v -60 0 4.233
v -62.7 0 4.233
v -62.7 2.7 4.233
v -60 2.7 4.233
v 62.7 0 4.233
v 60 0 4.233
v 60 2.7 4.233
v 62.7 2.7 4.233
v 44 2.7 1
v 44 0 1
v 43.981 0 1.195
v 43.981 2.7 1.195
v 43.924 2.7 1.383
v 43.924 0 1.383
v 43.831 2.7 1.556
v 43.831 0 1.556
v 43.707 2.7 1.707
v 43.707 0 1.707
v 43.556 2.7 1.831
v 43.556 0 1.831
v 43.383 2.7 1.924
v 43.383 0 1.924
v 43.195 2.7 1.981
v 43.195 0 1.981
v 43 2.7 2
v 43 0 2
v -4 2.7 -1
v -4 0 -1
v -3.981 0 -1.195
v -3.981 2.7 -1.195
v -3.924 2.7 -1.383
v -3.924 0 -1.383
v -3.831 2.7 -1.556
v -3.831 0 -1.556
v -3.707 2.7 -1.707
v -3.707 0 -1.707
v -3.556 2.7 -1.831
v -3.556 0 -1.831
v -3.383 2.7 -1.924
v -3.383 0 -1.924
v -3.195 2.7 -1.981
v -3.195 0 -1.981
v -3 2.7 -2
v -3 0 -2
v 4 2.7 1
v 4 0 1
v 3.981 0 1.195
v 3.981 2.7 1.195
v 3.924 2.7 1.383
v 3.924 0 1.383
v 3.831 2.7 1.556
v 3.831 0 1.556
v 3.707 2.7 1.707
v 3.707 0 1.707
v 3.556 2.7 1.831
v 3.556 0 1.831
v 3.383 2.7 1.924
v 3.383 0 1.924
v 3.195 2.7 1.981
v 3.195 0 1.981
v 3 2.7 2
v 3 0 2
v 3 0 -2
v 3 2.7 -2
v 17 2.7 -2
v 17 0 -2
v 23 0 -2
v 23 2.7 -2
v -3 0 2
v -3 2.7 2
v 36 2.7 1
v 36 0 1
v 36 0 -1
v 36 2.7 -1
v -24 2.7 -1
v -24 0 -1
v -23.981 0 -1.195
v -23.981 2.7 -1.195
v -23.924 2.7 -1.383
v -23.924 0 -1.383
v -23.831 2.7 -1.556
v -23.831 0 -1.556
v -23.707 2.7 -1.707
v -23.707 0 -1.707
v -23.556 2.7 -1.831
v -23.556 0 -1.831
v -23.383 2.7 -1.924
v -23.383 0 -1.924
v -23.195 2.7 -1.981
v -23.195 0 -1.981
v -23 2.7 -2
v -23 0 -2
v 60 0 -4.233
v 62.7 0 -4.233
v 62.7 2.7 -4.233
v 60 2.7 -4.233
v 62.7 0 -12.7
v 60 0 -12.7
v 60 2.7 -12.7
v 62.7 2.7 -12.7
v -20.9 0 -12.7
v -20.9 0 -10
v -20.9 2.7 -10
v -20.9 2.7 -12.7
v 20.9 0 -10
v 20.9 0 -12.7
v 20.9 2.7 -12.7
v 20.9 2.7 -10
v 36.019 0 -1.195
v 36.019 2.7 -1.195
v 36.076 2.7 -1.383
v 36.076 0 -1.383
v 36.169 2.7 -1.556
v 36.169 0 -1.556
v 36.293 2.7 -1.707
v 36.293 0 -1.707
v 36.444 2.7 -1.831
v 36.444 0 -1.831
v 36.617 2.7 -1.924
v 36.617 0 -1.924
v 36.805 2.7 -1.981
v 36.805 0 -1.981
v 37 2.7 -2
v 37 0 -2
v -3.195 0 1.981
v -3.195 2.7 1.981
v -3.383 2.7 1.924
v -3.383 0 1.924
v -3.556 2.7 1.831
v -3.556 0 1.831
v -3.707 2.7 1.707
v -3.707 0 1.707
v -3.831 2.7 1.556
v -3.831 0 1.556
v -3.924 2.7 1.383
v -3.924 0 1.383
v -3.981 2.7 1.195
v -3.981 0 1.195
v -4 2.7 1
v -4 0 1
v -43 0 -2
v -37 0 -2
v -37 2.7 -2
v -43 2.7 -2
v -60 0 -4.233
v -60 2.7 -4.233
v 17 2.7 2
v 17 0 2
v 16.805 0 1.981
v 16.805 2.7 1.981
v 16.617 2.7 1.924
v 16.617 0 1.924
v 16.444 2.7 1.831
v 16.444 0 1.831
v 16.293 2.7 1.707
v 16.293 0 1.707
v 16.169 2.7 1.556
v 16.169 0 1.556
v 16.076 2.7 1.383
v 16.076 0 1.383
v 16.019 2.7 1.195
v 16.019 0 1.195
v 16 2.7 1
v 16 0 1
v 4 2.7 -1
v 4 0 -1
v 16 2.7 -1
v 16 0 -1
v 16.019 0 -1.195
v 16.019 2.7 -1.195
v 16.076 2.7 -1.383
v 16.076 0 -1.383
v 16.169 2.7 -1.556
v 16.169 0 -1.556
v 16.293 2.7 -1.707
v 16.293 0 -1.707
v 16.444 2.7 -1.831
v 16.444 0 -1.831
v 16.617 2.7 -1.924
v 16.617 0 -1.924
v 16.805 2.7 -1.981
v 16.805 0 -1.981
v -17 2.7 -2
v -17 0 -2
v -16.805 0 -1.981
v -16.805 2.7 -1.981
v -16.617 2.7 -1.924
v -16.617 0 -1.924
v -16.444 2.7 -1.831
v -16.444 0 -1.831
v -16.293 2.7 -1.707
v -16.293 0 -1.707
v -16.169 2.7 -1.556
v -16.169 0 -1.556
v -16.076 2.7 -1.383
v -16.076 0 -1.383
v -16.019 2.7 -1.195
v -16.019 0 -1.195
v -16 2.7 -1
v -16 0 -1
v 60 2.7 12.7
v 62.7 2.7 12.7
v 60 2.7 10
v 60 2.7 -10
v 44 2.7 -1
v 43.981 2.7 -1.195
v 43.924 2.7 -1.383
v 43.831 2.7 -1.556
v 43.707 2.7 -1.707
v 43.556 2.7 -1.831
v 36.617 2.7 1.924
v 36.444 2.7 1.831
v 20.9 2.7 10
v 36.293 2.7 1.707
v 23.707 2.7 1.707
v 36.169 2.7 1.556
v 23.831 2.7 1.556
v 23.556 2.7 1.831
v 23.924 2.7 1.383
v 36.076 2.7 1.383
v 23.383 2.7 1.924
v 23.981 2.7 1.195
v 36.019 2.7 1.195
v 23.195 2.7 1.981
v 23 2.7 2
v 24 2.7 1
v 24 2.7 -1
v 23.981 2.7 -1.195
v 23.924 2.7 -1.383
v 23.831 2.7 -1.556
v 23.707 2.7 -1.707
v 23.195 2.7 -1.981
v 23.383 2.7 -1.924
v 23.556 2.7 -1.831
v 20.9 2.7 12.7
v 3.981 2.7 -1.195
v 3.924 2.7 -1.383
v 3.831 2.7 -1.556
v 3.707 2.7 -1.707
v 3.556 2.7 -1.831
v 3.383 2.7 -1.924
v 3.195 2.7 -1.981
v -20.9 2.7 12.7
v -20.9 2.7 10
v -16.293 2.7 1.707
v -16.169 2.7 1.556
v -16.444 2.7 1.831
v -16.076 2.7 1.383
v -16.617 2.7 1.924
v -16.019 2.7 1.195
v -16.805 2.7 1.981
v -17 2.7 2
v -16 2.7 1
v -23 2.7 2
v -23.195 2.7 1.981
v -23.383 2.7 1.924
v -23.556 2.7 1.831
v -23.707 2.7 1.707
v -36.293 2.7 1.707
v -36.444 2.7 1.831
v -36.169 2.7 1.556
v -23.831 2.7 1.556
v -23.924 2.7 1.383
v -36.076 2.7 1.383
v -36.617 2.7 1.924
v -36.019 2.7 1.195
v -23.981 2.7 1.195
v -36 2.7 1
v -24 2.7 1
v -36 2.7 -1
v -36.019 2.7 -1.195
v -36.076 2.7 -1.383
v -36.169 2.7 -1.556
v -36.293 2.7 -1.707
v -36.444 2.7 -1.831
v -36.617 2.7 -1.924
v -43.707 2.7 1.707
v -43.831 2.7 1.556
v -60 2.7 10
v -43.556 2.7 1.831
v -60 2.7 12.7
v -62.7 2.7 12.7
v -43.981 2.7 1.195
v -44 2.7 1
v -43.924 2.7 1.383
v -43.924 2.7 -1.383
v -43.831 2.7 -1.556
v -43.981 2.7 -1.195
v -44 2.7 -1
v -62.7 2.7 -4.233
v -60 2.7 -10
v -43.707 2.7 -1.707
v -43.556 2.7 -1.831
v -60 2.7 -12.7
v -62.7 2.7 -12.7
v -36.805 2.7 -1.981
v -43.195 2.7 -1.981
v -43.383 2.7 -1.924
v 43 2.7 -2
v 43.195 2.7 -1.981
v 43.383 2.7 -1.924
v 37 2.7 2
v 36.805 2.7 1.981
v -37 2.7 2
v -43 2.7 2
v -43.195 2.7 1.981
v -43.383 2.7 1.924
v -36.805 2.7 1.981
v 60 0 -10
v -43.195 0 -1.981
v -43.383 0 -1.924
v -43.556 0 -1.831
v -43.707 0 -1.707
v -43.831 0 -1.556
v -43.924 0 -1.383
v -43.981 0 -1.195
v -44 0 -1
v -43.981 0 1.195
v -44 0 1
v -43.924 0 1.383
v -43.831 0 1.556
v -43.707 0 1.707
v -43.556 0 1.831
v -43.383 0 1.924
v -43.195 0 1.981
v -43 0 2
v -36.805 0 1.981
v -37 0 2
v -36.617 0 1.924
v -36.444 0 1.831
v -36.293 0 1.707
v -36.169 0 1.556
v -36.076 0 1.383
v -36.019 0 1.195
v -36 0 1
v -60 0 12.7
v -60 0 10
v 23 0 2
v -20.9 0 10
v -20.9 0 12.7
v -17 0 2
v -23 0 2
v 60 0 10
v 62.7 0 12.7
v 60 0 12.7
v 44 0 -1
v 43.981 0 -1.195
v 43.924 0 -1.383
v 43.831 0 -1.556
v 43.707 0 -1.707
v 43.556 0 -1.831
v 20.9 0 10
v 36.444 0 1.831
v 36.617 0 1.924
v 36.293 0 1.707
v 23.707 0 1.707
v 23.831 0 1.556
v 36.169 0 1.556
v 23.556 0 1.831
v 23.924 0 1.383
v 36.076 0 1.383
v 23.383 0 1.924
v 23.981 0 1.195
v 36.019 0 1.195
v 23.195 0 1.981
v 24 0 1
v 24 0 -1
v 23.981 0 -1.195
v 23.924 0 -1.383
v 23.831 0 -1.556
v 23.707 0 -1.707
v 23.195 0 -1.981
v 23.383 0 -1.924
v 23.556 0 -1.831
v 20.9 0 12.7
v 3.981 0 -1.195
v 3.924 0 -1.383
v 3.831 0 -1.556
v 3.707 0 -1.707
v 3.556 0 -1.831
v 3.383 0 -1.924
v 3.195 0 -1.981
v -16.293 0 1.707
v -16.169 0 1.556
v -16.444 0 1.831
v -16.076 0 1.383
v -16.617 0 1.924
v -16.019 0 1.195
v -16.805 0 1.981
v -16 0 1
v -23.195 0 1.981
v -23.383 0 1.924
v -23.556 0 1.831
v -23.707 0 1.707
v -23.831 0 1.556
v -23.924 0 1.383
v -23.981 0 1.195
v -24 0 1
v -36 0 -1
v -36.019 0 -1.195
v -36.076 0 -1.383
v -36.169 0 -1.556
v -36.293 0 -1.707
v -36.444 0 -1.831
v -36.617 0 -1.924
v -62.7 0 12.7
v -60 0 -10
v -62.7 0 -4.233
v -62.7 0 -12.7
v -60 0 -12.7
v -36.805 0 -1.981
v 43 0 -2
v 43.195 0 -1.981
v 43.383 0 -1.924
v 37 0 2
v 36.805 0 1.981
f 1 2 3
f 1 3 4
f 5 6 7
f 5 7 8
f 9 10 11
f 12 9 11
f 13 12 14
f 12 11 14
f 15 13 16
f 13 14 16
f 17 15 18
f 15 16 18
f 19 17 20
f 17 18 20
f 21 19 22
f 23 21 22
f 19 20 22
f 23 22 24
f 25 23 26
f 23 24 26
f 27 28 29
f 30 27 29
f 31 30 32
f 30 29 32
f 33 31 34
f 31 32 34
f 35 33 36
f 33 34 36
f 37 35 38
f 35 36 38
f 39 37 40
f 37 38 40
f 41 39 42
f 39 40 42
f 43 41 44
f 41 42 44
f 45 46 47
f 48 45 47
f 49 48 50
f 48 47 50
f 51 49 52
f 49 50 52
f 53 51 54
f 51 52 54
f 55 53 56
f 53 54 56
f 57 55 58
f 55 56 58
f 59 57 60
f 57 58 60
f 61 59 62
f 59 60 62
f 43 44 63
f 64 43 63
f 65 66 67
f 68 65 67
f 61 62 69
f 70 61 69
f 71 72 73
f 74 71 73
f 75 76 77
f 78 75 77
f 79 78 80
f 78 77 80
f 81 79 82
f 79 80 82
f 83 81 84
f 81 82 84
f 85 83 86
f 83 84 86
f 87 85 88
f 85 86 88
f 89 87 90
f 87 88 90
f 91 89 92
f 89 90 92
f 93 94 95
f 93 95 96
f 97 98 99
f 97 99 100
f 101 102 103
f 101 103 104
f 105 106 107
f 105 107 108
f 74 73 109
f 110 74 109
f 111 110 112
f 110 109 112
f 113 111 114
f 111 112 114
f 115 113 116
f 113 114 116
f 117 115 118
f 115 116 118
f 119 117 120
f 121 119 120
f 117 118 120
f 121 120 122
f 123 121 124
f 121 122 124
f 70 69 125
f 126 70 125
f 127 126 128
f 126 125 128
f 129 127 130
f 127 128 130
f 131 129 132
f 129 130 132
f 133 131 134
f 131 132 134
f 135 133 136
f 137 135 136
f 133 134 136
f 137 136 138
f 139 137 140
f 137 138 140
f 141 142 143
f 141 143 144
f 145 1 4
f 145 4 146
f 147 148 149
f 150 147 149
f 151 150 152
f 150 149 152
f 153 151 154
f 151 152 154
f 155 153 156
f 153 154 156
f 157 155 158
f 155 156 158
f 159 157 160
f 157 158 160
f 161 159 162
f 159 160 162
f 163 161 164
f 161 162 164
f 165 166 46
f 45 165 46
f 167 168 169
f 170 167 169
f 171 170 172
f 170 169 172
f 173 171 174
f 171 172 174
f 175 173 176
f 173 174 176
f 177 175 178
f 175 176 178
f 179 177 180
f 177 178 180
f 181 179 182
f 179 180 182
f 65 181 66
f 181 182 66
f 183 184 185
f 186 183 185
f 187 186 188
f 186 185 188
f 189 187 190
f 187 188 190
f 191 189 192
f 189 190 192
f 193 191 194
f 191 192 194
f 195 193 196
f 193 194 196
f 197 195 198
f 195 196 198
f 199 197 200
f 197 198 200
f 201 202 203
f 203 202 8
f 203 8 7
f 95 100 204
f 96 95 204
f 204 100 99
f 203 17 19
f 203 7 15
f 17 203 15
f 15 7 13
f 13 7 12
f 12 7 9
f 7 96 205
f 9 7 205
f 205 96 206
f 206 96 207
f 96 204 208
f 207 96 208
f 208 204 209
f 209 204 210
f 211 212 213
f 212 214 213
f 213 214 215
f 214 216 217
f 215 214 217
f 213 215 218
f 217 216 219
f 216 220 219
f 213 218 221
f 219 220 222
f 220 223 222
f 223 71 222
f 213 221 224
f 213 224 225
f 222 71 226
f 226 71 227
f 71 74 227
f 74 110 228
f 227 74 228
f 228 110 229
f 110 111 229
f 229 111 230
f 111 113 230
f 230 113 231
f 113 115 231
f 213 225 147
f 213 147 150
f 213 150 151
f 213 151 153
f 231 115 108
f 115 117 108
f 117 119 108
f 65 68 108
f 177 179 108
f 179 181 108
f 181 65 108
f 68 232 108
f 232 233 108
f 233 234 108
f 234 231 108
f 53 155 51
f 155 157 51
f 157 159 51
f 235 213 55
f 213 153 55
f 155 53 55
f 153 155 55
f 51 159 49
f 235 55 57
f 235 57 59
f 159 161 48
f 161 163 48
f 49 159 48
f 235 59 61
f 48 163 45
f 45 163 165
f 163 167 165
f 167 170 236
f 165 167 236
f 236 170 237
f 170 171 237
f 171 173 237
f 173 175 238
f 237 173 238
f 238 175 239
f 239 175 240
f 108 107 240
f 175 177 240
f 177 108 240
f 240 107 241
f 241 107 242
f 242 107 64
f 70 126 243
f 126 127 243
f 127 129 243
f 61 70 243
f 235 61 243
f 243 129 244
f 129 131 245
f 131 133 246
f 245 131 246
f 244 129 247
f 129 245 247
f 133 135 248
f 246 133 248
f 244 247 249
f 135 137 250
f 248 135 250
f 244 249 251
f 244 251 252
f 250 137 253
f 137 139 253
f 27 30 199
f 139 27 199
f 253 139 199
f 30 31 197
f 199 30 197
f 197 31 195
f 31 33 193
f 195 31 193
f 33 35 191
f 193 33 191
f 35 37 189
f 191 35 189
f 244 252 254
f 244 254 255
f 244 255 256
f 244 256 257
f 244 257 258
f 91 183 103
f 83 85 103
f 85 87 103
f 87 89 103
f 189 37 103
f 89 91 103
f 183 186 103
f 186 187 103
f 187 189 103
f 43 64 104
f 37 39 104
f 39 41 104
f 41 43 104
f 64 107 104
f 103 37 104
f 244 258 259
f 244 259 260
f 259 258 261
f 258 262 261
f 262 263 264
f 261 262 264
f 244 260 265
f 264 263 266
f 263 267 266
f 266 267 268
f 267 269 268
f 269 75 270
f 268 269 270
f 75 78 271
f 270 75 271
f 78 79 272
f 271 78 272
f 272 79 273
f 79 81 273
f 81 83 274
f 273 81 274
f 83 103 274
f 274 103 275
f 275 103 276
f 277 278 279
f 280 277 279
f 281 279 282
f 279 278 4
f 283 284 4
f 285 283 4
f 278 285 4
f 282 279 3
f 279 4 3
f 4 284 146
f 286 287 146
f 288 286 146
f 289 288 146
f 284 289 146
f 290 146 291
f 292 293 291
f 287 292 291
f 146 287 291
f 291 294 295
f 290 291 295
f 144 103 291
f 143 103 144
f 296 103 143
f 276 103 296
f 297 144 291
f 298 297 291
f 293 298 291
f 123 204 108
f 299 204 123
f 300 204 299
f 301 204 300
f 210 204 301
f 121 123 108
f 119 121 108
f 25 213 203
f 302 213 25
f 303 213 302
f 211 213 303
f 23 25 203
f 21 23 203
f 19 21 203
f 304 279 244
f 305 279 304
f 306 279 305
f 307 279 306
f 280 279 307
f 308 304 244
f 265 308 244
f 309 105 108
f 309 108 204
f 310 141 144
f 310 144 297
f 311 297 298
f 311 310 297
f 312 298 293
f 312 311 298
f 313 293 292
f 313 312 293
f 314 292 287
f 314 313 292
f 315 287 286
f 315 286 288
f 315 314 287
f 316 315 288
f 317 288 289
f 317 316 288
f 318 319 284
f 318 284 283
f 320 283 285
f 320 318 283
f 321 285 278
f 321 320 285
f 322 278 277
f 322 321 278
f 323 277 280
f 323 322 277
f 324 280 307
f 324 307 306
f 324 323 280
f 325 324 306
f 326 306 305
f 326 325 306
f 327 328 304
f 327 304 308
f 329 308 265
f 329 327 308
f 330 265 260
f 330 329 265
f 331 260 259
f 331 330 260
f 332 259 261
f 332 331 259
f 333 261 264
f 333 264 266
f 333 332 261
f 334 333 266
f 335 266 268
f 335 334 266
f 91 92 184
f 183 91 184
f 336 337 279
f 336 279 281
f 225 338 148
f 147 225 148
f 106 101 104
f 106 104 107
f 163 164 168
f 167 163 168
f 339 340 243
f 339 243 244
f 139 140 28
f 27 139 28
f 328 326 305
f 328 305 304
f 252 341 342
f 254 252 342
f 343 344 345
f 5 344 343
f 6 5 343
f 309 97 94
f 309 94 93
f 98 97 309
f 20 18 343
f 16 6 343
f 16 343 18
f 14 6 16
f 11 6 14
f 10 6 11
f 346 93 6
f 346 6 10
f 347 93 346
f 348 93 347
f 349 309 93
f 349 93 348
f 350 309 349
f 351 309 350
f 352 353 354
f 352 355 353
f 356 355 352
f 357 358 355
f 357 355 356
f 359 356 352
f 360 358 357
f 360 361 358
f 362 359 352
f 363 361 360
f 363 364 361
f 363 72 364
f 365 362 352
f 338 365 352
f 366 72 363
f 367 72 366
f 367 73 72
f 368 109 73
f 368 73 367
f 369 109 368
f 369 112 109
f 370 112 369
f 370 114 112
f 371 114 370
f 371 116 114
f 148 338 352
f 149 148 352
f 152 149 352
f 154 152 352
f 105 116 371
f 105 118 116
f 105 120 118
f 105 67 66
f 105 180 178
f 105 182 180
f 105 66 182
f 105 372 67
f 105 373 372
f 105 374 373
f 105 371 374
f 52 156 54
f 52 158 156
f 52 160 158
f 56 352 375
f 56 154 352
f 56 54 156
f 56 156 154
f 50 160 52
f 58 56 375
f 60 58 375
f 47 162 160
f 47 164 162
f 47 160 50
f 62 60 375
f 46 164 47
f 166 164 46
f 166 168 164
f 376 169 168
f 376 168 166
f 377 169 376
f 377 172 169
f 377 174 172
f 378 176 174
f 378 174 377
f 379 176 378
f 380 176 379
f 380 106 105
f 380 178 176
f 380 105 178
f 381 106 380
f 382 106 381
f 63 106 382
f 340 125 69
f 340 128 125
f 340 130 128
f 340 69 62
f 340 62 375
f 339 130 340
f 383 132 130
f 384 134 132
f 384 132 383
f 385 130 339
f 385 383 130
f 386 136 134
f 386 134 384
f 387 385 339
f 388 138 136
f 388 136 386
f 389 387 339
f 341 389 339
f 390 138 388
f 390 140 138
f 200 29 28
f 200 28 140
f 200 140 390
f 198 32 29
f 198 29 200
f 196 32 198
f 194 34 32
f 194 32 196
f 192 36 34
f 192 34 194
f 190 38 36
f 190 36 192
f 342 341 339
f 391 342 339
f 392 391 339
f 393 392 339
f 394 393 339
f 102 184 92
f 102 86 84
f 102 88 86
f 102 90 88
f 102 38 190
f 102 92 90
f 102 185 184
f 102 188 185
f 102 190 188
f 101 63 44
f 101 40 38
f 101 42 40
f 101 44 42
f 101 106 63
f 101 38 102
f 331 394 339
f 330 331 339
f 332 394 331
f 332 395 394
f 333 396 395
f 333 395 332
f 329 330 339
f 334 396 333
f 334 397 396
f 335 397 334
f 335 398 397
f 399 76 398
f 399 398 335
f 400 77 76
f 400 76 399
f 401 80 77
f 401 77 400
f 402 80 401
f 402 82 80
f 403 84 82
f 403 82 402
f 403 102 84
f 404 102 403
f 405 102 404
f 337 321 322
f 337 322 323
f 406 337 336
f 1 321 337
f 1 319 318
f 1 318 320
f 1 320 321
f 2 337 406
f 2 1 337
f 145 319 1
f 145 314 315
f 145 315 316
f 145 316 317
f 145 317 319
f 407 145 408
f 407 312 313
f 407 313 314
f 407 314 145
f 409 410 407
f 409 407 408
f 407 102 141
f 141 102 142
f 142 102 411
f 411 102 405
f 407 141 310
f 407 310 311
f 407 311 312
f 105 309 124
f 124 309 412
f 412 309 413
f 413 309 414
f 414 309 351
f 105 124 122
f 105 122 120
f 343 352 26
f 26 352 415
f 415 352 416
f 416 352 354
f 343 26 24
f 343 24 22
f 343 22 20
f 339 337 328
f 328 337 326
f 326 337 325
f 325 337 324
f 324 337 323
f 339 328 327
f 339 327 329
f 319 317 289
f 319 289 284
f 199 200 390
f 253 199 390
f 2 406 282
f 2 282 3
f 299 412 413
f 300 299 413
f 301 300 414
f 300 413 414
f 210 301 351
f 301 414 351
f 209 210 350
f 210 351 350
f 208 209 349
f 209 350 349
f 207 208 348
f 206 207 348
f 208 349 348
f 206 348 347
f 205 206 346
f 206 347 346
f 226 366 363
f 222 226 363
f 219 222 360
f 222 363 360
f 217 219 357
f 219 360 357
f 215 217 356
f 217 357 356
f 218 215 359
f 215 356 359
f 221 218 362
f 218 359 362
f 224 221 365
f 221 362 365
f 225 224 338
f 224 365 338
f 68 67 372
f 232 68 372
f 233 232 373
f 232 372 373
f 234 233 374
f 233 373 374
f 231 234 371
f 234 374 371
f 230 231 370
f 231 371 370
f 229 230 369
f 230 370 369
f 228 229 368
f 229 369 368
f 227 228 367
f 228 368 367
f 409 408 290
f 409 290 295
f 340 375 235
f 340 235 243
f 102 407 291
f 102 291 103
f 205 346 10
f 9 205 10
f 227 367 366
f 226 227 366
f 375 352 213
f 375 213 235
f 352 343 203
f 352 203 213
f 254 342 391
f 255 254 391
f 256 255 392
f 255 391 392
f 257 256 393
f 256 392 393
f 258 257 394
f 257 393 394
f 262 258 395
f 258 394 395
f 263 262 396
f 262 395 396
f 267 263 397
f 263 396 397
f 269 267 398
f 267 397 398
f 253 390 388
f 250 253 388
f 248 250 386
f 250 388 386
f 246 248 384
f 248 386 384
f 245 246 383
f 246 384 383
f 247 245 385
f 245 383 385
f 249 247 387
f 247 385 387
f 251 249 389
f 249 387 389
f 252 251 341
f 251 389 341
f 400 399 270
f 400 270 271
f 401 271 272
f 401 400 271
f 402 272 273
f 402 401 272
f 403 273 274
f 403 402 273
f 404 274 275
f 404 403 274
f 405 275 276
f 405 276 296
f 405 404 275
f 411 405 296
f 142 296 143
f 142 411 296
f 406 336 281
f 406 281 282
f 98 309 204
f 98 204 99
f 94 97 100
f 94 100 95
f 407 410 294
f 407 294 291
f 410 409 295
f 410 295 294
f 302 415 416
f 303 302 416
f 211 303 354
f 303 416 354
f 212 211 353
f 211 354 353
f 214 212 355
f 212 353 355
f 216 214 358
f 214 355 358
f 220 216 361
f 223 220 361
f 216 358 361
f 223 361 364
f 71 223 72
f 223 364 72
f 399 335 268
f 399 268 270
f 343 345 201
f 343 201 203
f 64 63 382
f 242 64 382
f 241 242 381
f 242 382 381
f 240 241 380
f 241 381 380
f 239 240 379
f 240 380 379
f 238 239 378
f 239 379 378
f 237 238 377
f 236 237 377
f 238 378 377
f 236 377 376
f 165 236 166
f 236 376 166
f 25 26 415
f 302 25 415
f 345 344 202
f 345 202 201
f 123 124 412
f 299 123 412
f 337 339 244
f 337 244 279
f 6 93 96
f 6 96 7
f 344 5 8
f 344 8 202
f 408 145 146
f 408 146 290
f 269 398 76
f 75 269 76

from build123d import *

# Parameters (mm, degrees)
BOSS_EXTRUDE1_DEPTH = 2.7


with BuildPart() as part:
    # Sketch1 → Boss-Extrude1 (new body)
    with BuildSketch(Plane(origin=(0, 0, 0), x_dir=(1, 0, 0), z_dir=(0, 1, 0))):
        Polygon((-62.7, 12.7), (-60, 12.7), (-60, 10), (-20.9, 10), (-20.9, 12.7), (20.9, 12.7), (20.9, 10), (60, 10), (60, 12.7), (62.7, 12.7), (62.7, 4.233333333), (60, 4.233333333), (60, -4.233333333), (62.7, -4.233333333), (62.7, -12.7), (60, -12.7), (60, -10), (20.9, -10), (20.9, -12.7), (-20.9, -12.7), (-20.9, -10), (-60, -10), (-60, -12.7), (-62.7, -12.7), (-62.7, -4.233333333), (-60, -4.233333333), (-60, 4.233333333), (-62.7, 4.233333333), align=None)
        with BuildLine():
            Line((-37, 2), (-43, 2))
            ThreePointArc((-43, 2), (-43.707106781, 1.707106781), (-44, 1))
            Line((-44, 1), (-44, -1))
            ThreePointArc((-44, -1), (-43.707106781, -1.707106781), (-43, -2))
            Line((-43, -2), (-37, -2))
            ThreePointArc((-37, -2), (-36.292893219, -1.707106781), (-36, -1))
            Line((-36, -1), (-36, 1))
            ThreePointArc((-36, 1), (-36.292893219, 1.707106781), (-37, 2))
        make_face(mode=Mode.SUBTRACT)
        with BuildLine():
            Line((-23, 2), (-17, 2))
            ThreePointArc((-17, 2), (-16.292893219, 1.707106781), (-16, 1))
            Line((-16, 1), (-16, -1))
            ThreePointArc((-16, -1), (-16.292893219, -1.707106781), (-17, -2))
            Line((-17, -2), (-23, -2))
            ThreePointArc((-23, -2), (-23.707106781, -1.707106781), (-24, -1))
            Line((-24, -1), (-24, 1))
            ThreePointArc((-24, 1), (-23.707106781, 1.707106781), (-23, 2))
        make_face(mode=Mode.SUBTRACT)
        with BuildLine():
            Line((-3, 2), (3, 2))
            ThreePointArc((3, 2), (3.707106781, 1.707106781), (4, 1))
            Line((4, 1), (4, -1))
            ThreePointArc((4, -1), (3.707106781, -1.707106781), (3, -2))
            Line((3, -2), (-3, -2))
            ThreePointArc((-3, -2), (-3.707106781, -1.707106781), (-4, -1))
            Line((-4, -1), (-4, 1))
            ThreePointArc((-4, 1), (-3.707106781, 1.707106781), (-3, 2))
        make_face(mode=Mode.SUBTRACT)
        with BuildLine():
            Line((17, 2), (23, 2))
            ThreePointArc((23, 2), (23.707106781, 1.707106781), (24, 1))
            Line((24, 1), (24, -1))
            ThreePointArc((24, -1), (23.707106781, -1.707106781), (23, -2))
            Line((23, -2), (17, -2))
            ThreePointArc((17, -2), (16.292893219, -1.707106781), (16, -1))
            Line((16, -1), (16, 1))
            ThreePointArc((16, 1), (16.292893219, 1.707106781), (17, 2))
        make_face(mode=Mode.SUBTRACT)
        with BuildLine():
            Line((37, 2), (43, 2))
            ThreePointArc((43, 2), (43.707106781, 1.707106781), (44, 1))
            Line((44, 1), (44, -1))
            ThreePointArc((44, -1), (43.707106781, -1.707106781), (43, -2))
            Line((43, -2), (37, -2))
            ThreePointArc((37, -2), (36.292893219, -1.707106781), (36, -1))
            Line((36, -1), (36, 1))
            ThreePointArc((36, 1), (36.292893219, 1.707106781), (37, 2))
        make_face(mode=Mode.SUBTRACT)
    extrude(amount=BOSS_EXTRUDE1_DEPTH)


solid = part.part
